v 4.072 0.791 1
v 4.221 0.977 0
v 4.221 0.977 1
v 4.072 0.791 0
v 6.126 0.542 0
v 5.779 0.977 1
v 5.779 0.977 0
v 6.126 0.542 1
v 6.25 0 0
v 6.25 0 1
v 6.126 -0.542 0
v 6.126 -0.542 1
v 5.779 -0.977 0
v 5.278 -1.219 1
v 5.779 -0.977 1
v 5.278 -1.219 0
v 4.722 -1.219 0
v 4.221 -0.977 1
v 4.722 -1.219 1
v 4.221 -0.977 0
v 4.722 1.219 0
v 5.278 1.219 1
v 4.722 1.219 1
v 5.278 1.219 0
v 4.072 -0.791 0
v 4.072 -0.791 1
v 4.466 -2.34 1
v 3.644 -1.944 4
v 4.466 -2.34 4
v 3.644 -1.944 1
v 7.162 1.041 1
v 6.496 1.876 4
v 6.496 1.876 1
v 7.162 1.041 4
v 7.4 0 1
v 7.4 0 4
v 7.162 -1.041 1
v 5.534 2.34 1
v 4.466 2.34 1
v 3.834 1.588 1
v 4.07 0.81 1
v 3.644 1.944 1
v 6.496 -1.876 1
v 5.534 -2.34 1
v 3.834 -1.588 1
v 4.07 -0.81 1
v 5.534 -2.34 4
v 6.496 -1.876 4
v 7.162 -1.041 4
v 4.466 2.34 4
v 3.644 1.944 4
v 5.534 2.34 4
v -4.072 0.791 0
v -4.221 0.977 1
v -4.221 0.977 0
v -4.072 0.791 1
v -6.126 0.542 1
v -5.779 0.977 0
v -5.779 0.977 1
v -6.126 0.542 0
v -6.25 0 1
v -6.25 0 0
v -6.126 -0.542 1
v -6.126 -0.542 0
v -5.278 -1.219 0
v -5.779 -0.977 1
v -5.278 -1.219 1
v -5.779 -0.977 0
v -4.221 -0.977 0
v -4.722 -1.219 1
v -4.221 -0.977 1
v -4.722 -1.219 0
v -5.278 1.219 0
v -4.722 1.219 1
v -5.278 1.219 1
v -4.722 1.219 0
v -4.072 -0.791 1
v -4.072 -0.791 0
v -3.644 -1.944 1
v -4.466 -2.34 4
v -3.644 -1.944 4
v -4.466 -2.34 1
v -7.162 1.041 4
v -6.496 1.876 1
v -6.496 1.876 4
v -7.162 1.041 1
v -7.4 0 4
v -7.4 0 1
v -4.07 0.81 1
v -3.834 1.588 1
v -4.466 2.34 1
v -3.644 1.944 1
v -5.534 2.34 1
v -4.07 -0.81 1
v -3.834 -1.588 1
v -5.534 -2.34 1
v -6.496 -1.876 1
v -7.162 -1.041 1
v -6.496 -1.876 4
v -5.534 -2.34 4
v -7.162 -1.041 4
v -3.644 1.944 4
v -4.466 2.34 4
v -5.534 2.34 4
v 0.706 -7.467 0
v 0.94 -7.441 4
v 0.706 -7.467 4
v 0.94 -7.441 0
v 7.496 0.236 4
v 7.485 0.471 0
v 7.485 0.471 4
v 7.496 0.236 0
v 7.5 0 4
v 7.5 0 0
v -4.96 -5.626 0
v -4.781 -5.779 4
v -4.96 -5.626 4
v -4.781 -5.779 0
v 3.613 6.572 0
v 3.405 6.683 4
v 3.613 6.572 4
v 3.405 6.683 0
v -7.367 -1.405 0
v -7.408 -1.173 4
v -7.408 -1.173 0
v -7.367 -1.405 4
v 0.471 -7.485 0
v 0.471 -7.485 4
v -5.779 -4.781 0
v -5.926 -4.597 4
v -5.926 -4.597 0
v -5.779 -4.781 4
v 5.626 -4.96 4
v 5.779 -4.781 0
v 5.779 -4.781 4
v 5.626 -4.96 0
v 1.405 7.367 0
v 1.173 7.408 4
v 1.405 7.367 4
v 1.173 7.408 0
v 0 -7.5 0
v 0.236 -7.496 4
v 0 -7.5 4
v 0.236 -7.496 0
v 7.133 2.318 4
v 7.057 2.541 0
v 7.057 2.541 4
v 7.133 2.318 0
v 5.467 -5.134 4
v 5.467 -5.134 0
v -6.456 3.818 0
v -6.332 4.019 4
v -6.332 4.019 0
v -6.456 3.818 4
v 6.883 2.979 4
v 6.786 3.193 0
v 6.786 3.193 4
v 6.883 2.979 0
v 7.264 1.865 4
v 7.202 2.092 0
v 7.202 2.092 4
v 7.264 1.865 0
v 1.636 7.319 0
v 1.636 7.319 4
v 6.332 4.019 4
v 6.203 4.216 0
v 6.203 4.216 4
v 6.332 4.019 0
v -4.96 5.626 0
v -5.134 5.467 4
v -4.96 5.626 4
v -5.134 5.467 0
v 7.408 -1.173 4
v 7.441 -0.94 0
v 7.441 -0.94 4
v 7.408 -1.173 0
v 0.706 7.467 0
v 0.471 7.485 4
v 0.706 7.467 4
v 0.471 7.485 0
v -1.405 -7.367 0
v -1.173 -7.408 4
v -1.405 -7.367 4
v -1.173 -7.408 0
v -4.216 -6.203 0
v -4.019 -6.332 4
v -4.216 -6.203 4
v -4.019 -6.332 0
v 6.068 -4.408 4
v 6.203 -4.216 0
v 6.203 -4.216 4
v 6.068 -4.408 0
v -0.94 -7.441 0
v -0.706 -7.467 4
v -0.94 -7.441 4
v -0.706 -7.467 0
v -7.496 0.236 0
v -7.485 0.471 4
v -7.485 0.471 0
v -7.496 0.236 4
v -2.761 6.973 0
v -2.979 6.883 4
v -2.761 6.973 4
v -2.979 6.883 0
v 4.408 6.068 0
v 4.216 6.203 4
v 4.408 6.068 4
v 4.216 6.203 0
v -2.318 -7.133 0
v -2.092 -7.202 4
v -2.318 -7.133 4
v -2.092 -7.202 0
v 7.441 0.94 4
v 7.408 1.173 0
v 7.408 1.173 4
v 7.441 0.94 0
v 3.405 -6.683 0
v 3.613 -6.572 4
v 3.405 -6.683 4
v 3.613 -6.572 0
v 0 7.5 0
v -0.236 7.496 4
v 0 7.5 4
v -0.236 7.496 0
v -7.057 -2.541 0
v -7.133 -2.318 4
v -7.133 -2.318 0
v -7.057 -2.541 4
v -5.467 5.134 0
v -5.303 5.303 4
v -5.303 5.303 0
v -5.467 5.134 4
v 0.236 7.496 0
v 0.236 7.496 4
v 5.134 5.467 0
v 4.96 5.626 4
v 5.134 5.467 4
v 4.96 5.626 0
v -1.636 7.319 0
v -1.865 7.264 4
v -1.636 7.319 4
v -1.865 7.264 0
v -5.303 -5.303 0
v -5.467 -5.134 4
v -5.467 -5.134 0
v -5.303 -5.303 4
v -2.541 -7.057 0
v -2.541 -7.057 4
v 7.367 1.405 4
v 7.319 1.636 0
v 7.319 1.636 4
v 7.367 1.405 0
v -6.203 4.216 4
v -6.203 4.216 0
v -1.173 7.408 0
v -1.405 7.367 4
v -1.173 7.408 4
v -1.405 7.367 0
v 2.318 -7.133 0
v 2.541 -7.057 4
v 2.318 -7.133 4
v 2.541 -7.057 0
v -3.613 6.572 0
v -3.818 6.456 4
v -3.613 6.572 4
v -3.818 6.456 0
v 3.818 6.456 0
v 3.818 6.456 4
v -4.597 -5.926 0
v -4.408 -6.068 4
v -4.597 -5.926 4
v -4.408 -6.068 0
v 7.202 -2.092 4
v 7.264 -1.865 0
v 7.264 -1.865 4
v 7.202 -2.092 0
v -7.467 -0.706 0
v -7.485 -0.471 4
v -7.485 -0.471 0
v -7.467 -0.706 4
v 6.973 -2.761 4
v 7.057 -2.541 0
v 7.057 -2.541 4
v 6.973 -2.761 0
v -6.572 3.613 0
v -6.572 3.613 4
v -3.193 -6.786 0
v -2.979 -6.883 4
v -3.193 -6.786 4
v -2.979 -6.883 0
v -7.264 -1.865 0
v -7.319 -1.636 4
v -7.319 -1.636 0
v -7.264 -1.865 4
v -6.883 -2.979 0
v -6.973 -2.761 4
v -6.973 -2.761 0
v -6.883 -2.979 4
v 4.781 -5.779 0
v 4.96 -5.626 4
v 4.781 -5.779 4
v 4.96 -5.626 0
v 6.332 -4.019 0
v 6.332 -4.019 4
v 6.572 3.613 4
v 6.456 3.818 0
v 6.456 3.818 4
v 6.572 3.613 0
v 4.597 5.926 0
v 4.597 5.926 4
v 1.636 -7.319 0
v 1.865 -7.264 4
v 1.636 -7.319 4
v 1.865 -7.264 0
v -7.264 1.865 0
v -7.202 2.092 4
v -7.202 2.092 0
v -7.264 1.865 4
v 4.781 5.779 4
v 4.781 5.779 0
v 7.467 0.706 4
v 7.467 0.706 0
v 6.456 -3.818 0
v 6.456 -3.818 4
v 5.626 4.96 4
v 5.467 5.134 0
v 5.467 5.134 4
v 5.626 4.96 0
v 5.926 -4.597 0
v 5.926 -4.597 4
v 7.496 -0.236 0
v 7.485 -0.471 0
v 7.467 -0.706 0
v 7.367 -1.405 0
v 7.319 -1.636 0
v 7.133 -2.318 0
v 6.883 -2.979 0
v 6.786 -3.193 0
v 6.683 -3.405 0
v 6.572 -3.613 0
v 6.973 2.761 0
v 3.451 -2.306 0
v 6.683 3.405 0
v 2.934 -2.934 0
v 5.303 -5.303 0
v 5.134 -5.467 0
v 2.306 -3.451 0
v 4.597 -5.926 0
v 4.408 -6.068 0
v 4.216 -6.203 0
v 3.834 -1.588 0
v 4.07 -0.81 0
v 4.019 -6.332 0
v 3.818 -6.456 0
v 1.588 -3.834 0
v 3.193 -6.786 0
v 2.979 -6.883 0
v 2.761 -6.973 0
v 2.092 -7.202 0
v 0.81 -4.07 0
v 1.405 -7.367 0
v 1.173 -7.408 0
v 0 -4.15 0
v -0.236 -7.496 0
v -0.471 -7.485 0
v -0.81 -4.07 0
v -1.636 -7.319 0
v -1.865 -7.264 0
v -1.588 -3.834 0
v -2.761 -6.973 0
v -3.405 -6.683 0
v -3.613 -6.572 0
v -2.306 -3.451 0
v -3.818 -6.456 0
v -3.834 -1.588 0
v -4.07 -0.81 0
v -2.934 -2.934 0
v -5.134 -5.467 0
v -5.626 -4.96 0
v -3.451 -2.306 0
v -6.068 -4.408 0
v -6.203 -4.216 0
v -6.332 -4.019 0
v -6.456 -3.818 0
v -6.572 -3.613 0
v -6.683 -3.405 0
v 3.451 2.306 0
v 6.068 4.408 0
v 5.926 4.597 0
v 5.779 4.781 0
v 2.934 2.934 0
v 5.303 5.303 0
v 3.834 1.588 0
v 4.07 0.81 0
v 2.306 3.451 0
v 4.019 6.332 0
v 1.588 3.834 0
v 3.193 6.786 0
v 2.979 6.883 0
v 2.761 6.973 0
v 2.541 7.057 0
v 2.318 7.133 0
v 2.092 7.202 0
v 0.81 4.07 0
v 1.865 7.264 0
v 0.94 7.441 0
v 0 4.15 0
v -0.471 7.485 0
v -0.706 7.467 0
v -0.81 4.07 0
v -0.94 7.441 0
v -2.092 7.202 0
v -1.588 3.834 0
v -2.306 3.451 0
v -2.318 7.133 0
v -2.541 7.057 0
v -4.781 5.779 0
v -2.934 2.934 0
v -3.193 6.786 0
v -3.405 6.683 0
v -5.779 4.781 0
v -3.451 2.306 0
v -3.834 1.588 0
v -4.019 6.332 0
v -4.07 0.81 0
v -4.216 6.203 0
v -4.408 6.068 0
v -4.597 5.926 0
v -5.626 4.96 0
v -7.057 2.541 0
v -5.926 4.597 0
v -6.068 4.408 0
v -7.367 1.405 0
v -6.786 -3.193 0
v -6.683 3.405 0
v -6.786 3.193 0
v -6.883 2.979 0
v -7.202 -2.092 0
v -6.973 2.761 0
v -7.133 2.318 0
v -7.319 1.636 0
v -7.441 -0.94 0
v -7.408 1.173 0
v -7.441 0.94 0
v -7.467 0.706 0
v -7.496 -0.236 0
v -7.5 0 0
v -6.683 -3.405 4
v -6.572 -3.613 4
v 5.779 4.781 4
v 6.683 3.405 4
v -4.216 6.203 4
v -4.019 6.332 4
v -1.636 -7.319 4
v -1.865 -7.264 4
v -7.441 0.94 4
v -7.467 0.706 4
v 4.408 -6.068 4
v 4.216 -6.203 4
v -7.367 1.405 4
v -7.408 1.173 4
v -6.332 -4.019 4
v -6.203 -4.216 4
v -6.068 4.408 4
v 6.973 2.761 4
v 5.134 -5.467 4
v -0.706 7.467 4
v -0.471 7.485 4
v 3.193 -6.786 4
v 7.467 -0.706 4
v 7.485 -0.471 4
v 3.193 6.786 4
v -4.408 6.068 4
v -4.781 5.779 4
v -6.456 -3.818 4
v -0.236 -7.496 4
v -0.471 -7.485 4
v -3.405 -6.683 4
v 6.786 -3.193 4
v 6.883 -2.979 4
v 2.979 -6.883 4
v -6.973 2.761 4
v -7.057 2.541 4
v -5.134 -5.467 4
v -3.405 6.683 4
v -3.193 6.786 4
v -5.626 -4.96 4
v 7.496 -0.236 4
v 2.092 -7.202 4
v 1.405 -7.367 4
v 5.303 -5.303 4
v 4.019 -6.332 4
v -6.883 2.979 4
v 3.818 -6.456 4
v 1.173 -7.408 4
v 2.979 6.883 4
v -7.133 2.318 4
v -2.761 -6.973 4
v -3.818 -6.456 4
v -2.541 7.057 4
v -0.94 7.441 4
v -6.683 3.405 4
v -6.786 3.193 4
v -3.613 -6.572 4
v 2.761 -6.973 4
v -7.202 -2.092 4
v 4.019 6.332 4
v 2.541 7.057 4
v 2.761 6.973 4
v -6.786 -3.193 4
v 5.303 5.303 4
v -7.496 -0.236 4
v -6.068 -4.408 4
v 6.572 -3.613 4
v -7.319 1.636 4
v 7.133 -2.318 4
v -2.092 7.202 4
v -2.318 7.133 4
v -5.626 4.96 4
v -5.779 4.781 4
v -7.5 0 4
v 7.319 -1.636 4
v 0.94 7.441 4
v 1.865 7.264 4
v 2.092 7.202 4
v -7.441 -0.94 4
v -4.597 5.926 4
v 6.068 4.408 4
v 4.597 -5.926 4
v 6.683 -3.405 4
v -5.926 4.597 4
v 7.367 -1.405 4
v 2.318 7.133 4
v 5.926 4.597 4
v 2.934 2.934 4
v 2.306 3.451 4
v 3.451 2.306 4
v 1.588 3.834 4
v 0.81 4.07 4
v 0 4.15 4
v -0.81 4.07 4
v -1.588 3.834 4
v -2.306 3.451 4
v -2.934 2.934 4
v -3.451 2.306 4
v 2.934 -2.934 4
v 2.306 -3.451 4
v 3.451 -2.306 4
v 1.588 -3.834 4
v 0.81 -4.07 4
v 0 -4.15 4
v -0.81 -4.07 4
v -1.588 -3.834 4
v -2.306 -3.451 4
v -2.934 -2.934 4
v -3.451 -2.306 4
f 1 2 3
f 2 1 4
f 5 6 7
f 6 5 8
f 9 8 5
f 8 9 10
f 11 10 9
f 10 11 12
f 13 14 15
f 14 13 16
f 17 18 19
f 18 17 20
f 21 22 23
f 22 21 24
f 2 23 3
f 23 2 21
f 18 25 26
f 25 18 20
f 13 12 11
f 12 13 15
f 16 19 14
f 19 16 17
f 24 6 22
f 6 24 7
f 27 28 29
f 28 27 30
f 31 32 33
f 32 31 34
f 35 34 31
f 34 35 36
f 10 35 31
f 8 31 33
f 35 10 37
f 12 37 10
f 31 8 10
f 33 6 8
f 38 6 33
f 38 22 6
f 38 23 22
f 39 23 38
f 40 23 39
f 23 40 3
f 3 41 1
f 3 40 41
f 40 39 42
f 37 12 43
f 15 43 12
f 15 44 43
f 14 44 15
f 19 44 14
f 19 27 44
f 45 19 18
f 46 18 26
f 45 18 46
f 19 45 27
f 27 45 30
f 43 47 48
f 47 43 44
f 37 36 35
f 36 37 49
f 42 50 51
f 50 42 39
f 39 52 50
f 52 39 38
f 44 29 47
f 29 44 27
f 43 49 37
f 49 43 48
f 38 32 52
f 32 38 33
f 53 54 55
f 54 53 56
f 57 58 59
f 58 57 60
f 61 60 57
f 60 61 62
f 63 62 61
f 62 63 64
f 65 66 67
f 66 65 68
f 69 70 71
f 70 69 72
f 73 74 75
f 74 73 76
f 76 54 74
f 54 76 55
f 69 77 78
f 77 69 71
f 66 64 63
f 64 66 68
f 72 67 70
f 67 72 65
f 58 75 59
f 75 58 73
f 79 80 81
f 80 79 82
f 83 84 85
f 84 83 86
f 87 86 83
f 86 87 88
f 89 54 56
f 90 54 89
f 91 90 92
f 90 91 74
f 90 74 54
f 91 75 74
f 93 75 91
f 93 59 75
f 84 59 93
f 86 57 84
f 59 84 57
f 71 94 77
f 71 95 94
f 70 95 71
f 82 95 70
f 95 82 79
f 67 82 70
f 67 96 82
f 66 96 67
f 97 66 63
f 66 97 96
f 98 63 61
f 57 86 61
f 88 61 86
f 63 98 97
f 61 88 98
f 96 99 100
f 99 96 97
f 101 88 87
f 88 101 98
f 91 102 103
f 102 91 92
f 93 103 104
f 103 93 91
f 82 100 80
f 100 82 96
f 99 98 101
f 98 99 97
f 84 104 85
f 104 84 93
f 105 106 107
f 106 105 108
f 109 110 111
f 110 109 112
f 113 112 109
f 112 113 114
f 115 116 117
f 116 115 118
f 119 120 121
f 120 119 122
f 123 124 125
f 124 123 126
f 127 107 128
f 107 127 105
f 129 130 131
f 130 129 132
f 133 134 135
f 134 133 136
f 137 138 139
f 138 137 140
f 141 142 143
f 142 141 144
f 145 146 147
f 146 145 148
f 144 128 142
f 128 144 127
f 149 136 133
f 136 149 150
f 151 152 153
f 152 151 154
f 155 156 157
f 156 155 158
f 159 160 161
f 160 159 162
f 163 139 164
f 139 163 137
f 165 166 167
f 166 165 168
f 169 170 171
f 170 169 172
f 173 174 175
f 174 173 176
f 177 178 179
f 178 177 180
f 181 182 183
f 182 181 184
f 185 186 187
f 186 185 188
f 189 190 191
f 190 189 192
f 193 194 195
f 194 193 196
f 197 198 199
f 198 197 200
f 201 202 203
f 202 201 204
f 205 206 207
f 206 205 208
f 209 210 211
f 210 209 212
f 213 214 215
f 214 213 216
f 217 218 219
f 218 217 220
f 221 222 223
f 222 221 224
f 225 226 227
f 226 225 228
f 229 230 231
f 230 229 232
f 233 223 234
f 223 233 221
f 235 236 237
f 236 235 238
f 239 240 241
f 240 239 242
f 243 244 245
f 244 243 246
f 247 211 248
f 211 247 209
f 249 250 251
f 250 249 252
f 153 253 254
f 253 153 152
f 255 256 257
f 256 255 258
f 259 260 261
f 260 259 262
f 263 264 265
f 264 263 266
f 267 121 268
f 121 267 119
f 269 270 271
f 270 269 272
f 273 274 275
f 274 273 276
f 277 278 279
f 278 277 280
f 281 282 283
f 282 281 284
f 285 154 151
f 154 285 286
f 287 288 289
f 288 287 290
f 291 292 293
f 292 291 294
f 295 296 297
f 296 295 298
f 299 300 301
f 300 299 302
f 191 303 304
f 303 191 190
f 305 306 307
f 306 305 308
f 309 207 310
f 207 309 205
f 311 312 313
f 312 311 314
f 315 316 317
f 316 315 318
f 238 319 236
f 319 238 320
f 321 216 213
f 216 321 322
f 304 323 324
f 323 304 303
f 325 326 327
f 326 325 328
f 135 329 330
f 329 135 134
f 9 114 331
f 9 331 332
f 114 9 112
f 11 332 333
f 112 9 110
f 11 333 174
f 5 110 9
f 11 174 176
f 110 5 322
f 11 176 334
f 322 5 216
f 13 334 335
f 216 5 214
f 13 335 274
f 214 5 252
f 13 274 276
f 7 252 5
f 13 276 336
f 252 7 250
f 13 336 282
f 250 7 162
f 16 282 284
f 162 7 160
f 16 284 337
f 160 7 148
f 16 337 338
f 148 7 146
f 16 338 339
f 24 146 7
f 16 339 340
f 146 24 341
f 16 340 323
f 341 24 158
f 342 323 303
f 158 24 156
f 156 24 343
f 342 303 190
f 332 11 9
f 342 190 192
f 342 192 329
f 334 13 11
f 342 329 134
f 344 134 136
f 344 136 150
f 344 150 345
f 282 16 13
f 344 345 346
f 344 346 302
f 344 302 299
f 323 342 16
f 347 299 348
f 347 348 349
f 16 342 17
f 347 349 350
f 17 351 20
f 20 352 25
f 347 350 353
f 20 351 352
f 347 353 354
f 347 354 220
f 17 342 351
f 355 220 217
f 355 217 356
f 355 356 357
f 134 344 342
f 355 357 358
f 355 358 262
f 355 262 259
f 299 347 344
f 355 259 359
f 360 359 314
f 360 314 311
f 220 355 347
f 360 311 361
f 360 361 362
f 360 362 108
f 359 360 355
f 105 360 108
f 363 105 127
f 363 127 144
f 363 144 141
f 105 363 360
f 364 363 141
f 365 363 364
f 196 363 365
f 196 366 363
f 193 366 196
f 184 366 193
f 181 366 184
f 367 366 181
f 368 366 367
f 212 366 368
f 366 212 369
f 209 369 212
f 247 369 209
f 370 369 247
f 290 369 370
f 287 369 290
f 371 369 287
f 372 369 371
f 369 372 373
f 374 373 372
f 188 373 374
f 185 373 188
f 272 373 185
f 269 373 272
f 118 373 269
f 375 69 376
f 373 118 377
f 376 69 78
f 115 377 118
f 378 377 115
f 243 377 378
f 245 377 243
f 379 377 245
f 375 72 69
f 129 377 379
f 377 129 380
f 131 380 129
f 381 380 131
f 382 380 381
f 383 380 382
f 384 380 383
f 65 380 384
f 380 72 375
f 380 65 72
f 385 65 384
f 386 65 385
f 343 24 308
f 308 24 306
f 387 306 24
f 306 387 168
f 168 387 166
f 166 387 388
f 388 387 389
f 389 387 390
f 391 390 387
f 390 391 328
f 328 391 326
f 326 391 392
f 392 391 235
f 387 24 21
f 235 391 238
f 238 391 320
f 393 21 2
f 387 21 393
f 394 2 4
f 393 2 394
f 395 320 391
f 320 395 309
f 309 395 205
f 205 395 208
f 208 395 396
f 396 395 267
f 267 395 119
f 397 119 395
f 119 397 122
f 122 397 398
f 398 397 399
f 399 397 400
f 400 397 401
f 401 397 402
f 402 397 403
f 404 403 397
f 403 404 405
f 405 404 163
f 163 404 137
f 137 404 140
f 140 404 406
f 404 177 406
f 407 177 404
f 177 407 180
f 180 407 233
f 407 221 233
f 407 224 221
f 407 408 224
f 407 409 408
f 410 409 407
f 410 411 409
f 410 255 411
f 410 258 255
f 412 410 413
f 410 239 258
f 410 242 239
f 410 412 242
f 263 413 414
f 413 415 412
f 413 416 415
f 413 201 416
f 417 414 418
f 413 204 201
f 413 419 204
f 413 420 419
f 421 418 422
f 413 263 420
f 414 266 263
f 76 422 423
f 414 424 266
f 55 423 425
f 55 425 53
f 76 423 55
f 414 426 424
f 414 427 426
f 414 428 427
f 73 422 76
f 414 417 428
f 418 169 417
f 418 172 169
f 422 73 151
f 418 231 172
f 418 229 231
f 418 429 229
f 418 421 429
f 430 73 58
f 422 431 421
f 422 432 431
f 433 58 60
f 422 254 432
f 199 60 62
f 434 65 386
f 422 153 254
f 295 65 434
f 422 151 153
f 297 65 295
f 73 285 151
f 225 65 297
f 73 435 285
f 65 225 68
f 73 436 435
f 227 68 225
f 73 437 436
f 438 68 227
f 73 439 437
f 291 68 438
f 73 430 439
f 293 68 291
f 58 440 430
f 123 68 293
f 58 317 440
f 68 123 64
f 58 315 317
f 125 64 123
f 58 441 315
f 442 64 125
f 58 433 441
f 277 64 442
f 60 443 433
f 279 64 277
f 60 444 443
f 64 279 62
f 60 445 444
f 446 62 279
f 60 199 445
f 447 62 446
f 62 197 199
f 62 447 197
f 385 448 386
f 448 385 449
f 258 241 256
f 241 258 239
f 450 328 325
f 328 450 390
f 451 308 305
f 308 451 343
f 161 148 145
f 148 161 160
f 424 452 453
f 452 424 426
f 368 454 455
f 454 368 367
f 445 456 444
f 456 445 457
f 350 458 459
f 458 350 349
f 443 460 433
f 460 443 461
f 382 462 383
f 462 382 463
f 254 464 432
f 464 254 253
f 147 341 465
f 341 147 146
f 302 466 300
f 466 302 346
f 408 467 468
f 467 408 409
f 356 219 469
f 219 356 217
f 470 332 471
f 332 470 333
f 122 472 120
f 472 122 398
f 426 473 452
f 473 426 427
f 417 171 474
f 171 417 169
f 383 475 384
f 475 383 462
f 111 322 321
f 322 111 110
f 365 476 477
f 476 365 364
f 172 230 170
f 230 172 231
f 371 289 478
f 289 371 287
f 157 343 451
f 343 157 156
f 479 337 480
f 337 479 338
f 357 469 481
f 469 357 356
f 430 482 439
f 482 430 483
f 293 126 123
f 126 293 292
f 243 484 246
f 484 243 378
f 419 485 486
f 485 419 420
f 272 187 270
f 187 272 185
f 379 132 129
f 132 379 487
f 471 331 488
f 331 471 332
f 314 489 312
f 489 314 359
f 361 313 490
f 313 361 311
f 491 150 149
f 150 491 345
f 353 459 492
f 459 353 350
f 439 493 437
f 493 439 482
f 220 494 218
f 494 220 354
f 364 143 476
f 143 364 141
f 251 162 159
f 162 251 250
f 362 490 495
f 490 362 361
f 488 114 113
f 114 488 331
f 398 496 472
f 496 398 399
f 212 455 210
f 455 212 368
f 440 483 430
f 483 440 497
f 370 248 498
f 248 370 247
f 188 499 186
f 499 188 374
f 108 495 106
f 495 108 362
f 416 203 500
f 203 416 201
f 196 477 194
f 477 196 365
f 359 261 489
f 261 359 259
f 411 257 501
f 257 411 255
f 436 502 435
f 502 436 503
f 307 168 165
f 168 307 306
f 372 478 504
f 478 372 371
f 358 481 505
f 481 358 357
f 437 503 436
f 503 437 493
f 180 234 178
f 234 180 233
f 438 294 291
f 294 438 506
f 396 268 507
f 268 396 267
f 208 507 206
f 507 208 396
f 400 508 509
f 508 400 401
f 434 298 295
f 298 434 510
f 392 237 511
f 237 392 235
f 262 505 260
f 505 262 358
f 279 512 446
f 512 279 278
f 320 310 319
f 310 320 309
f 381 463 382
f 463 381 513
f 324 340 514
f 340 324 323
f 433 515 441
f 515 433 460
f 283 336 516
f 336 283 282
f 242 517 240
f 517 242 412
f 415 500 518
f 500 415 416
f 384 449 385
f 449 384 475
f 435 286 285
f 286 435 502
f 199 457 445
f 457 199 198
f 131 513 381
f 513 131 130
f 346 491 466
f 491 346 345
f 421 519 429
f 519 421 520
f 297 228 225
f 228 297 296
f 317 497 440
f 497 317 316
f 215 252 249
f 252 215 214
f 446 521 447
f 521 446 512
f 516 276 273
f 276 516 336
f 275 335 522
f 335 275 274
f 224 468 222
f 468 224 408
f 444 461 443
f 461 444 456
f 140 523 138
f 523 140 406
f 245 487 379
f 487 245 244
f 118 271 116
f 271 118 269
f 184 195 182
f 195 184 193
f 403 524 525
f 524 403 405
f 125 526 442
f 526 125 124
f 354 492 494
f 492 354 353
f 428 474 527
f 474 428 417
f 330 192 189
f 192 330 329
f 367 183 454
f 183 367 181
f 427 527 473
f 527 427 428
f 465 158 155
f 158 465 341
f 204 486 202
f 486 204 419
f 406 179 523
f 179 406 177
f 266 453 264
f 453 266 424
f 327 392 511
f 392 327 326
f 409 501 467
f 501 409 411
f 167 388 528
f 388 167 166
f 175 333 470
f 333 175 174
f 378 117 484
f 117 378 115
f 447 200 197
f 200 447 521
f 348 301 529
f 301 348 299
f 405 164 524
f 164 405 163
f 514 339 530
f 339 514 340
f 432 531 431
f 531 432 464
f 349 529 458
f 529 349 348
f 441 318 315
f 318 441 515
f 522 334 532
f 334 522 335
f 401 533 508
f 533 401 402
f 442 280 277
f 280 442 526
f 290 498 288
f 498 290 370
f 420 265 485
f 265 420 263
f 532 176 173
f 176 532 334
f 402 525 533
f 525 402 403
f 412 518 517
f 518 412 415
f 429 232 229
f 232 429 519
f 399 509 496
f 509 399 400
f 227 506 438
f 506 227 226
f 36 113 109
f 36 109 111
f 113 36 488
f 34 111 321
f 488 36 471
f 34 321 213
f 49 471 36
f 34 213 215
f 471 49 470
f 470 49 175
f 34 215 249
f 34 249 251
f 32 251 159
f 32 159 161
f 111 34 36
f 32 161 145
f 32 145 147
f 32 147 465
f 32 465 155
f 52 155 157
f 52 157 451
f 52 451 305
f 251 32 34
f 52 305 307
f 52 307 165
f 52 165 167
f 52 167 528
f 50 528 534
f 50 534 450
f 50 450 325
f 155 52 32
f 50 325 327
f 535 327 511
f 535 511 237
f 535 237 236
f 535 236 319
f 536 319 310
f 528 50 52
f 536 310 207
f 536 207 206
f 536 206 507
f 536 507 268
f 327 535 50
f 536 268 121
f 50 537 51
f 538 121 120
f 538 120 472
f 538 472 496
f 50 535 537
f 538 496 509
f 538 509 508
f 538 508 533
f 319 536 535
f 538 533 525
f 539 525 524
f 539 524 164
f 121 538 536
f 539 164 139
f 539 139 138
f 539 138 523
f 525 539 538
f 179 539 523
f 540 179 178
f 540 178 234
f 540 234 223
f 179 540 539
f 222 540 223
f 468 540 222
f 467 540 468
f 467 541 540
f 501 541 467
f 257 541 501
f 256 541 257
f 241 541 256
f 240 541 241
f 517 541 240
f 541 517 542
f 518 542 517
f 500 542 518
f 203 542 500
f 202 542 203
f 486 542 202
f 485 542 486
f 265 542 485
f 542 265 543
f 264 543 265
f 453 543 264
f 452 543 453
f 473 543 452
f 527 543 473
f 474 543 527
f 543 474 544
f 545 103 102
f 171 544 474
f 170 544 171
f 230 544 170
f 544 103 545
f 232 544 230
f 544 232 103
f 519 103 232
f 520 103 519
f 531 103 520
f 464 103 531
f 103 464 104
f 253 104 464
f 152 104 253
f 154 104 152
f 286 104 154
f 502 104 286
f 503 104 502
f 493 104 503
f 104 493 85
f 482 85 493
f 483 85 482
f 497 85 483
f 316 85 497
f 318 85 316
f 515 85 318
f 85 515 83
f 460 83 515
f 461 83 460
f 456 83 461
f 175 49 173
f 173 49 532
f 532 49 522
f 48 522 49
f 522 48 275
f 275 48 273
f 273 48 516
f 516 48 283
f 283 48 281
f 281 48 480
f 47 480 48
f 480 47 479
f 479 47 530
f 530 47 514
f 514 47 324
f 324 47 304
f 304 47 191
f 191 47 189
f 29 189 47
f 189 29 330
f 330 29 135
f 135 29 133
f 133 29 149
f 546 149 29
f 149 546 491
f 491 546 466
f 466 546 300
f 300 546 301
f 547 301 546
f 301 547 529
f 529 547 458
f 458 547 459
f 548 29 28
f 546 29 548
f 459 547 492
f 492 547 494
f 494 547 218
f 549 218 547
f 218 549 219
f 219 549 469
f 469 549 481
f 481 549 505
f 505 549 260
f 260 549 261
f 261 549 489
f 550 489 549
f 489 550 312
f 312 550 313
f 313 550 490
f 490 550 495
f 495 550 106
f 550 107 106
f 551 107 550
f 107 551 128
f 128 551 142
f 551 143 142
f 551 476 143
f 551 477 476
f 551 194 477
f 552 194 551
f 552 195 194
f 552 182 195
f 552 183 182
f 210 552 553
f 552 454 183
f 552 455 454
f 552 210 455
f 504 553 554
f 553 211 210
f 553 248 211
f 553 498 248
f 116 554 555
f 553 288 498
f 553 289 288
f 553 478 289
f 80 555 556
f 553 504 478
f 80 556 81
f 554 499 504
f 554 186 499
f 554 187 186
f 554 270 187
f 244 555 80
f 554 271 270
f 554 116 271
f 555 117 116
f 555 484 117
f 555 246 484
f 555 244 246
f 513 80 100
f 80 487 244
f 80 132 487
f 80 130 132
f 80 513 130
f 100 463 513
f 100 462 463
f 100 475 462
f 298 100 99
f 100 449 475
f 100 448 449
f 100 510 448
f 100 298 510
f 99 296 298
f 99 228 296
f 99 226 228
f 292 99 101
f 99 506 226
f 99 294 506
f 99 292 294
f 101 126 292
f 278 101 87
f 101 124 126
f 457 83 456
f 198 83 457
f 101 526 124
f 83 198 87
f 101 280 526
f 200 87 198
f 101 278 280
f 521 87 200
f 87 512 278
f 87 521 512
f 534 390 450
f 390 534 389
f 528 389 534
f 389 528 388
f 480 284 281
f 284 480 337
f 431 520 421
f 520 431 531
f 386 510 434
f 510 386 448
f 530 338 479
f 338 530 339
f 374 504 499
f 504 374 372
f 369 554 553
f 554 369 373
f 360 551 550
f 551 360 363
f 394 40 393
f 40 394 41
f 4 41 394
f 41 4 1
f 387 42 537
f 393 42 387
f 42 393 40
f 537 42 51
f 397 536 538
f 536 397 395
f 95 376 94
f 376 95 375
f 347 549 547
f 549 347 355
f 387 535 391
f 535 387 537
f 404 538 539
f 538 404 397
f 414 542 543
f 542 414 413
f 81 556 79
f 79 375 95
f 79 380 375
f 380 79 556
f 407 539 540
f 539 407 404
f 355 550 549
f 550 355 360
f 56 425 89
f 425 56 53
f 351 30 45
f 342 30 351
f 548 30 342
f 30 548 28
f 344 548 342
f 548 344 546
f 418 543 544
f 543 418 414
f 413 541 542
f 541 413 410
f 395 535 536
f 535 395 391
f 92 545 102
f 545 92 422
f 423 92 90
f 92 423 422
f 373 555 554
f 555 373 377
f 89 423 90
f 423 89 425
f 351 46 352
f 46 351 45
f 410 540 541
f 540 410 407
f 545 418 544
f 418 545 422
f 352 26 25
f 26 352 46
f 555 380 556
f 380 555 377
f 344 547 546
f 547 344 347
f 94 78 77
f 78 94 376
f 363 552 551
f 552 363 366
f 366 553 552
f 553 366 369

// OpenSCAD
use <./libs/illumination.scad>

condenser_led_holder_stl();

module condenser_led_holder_stl(){
    condenser_led_holder(led_r=7.8/2);
}
